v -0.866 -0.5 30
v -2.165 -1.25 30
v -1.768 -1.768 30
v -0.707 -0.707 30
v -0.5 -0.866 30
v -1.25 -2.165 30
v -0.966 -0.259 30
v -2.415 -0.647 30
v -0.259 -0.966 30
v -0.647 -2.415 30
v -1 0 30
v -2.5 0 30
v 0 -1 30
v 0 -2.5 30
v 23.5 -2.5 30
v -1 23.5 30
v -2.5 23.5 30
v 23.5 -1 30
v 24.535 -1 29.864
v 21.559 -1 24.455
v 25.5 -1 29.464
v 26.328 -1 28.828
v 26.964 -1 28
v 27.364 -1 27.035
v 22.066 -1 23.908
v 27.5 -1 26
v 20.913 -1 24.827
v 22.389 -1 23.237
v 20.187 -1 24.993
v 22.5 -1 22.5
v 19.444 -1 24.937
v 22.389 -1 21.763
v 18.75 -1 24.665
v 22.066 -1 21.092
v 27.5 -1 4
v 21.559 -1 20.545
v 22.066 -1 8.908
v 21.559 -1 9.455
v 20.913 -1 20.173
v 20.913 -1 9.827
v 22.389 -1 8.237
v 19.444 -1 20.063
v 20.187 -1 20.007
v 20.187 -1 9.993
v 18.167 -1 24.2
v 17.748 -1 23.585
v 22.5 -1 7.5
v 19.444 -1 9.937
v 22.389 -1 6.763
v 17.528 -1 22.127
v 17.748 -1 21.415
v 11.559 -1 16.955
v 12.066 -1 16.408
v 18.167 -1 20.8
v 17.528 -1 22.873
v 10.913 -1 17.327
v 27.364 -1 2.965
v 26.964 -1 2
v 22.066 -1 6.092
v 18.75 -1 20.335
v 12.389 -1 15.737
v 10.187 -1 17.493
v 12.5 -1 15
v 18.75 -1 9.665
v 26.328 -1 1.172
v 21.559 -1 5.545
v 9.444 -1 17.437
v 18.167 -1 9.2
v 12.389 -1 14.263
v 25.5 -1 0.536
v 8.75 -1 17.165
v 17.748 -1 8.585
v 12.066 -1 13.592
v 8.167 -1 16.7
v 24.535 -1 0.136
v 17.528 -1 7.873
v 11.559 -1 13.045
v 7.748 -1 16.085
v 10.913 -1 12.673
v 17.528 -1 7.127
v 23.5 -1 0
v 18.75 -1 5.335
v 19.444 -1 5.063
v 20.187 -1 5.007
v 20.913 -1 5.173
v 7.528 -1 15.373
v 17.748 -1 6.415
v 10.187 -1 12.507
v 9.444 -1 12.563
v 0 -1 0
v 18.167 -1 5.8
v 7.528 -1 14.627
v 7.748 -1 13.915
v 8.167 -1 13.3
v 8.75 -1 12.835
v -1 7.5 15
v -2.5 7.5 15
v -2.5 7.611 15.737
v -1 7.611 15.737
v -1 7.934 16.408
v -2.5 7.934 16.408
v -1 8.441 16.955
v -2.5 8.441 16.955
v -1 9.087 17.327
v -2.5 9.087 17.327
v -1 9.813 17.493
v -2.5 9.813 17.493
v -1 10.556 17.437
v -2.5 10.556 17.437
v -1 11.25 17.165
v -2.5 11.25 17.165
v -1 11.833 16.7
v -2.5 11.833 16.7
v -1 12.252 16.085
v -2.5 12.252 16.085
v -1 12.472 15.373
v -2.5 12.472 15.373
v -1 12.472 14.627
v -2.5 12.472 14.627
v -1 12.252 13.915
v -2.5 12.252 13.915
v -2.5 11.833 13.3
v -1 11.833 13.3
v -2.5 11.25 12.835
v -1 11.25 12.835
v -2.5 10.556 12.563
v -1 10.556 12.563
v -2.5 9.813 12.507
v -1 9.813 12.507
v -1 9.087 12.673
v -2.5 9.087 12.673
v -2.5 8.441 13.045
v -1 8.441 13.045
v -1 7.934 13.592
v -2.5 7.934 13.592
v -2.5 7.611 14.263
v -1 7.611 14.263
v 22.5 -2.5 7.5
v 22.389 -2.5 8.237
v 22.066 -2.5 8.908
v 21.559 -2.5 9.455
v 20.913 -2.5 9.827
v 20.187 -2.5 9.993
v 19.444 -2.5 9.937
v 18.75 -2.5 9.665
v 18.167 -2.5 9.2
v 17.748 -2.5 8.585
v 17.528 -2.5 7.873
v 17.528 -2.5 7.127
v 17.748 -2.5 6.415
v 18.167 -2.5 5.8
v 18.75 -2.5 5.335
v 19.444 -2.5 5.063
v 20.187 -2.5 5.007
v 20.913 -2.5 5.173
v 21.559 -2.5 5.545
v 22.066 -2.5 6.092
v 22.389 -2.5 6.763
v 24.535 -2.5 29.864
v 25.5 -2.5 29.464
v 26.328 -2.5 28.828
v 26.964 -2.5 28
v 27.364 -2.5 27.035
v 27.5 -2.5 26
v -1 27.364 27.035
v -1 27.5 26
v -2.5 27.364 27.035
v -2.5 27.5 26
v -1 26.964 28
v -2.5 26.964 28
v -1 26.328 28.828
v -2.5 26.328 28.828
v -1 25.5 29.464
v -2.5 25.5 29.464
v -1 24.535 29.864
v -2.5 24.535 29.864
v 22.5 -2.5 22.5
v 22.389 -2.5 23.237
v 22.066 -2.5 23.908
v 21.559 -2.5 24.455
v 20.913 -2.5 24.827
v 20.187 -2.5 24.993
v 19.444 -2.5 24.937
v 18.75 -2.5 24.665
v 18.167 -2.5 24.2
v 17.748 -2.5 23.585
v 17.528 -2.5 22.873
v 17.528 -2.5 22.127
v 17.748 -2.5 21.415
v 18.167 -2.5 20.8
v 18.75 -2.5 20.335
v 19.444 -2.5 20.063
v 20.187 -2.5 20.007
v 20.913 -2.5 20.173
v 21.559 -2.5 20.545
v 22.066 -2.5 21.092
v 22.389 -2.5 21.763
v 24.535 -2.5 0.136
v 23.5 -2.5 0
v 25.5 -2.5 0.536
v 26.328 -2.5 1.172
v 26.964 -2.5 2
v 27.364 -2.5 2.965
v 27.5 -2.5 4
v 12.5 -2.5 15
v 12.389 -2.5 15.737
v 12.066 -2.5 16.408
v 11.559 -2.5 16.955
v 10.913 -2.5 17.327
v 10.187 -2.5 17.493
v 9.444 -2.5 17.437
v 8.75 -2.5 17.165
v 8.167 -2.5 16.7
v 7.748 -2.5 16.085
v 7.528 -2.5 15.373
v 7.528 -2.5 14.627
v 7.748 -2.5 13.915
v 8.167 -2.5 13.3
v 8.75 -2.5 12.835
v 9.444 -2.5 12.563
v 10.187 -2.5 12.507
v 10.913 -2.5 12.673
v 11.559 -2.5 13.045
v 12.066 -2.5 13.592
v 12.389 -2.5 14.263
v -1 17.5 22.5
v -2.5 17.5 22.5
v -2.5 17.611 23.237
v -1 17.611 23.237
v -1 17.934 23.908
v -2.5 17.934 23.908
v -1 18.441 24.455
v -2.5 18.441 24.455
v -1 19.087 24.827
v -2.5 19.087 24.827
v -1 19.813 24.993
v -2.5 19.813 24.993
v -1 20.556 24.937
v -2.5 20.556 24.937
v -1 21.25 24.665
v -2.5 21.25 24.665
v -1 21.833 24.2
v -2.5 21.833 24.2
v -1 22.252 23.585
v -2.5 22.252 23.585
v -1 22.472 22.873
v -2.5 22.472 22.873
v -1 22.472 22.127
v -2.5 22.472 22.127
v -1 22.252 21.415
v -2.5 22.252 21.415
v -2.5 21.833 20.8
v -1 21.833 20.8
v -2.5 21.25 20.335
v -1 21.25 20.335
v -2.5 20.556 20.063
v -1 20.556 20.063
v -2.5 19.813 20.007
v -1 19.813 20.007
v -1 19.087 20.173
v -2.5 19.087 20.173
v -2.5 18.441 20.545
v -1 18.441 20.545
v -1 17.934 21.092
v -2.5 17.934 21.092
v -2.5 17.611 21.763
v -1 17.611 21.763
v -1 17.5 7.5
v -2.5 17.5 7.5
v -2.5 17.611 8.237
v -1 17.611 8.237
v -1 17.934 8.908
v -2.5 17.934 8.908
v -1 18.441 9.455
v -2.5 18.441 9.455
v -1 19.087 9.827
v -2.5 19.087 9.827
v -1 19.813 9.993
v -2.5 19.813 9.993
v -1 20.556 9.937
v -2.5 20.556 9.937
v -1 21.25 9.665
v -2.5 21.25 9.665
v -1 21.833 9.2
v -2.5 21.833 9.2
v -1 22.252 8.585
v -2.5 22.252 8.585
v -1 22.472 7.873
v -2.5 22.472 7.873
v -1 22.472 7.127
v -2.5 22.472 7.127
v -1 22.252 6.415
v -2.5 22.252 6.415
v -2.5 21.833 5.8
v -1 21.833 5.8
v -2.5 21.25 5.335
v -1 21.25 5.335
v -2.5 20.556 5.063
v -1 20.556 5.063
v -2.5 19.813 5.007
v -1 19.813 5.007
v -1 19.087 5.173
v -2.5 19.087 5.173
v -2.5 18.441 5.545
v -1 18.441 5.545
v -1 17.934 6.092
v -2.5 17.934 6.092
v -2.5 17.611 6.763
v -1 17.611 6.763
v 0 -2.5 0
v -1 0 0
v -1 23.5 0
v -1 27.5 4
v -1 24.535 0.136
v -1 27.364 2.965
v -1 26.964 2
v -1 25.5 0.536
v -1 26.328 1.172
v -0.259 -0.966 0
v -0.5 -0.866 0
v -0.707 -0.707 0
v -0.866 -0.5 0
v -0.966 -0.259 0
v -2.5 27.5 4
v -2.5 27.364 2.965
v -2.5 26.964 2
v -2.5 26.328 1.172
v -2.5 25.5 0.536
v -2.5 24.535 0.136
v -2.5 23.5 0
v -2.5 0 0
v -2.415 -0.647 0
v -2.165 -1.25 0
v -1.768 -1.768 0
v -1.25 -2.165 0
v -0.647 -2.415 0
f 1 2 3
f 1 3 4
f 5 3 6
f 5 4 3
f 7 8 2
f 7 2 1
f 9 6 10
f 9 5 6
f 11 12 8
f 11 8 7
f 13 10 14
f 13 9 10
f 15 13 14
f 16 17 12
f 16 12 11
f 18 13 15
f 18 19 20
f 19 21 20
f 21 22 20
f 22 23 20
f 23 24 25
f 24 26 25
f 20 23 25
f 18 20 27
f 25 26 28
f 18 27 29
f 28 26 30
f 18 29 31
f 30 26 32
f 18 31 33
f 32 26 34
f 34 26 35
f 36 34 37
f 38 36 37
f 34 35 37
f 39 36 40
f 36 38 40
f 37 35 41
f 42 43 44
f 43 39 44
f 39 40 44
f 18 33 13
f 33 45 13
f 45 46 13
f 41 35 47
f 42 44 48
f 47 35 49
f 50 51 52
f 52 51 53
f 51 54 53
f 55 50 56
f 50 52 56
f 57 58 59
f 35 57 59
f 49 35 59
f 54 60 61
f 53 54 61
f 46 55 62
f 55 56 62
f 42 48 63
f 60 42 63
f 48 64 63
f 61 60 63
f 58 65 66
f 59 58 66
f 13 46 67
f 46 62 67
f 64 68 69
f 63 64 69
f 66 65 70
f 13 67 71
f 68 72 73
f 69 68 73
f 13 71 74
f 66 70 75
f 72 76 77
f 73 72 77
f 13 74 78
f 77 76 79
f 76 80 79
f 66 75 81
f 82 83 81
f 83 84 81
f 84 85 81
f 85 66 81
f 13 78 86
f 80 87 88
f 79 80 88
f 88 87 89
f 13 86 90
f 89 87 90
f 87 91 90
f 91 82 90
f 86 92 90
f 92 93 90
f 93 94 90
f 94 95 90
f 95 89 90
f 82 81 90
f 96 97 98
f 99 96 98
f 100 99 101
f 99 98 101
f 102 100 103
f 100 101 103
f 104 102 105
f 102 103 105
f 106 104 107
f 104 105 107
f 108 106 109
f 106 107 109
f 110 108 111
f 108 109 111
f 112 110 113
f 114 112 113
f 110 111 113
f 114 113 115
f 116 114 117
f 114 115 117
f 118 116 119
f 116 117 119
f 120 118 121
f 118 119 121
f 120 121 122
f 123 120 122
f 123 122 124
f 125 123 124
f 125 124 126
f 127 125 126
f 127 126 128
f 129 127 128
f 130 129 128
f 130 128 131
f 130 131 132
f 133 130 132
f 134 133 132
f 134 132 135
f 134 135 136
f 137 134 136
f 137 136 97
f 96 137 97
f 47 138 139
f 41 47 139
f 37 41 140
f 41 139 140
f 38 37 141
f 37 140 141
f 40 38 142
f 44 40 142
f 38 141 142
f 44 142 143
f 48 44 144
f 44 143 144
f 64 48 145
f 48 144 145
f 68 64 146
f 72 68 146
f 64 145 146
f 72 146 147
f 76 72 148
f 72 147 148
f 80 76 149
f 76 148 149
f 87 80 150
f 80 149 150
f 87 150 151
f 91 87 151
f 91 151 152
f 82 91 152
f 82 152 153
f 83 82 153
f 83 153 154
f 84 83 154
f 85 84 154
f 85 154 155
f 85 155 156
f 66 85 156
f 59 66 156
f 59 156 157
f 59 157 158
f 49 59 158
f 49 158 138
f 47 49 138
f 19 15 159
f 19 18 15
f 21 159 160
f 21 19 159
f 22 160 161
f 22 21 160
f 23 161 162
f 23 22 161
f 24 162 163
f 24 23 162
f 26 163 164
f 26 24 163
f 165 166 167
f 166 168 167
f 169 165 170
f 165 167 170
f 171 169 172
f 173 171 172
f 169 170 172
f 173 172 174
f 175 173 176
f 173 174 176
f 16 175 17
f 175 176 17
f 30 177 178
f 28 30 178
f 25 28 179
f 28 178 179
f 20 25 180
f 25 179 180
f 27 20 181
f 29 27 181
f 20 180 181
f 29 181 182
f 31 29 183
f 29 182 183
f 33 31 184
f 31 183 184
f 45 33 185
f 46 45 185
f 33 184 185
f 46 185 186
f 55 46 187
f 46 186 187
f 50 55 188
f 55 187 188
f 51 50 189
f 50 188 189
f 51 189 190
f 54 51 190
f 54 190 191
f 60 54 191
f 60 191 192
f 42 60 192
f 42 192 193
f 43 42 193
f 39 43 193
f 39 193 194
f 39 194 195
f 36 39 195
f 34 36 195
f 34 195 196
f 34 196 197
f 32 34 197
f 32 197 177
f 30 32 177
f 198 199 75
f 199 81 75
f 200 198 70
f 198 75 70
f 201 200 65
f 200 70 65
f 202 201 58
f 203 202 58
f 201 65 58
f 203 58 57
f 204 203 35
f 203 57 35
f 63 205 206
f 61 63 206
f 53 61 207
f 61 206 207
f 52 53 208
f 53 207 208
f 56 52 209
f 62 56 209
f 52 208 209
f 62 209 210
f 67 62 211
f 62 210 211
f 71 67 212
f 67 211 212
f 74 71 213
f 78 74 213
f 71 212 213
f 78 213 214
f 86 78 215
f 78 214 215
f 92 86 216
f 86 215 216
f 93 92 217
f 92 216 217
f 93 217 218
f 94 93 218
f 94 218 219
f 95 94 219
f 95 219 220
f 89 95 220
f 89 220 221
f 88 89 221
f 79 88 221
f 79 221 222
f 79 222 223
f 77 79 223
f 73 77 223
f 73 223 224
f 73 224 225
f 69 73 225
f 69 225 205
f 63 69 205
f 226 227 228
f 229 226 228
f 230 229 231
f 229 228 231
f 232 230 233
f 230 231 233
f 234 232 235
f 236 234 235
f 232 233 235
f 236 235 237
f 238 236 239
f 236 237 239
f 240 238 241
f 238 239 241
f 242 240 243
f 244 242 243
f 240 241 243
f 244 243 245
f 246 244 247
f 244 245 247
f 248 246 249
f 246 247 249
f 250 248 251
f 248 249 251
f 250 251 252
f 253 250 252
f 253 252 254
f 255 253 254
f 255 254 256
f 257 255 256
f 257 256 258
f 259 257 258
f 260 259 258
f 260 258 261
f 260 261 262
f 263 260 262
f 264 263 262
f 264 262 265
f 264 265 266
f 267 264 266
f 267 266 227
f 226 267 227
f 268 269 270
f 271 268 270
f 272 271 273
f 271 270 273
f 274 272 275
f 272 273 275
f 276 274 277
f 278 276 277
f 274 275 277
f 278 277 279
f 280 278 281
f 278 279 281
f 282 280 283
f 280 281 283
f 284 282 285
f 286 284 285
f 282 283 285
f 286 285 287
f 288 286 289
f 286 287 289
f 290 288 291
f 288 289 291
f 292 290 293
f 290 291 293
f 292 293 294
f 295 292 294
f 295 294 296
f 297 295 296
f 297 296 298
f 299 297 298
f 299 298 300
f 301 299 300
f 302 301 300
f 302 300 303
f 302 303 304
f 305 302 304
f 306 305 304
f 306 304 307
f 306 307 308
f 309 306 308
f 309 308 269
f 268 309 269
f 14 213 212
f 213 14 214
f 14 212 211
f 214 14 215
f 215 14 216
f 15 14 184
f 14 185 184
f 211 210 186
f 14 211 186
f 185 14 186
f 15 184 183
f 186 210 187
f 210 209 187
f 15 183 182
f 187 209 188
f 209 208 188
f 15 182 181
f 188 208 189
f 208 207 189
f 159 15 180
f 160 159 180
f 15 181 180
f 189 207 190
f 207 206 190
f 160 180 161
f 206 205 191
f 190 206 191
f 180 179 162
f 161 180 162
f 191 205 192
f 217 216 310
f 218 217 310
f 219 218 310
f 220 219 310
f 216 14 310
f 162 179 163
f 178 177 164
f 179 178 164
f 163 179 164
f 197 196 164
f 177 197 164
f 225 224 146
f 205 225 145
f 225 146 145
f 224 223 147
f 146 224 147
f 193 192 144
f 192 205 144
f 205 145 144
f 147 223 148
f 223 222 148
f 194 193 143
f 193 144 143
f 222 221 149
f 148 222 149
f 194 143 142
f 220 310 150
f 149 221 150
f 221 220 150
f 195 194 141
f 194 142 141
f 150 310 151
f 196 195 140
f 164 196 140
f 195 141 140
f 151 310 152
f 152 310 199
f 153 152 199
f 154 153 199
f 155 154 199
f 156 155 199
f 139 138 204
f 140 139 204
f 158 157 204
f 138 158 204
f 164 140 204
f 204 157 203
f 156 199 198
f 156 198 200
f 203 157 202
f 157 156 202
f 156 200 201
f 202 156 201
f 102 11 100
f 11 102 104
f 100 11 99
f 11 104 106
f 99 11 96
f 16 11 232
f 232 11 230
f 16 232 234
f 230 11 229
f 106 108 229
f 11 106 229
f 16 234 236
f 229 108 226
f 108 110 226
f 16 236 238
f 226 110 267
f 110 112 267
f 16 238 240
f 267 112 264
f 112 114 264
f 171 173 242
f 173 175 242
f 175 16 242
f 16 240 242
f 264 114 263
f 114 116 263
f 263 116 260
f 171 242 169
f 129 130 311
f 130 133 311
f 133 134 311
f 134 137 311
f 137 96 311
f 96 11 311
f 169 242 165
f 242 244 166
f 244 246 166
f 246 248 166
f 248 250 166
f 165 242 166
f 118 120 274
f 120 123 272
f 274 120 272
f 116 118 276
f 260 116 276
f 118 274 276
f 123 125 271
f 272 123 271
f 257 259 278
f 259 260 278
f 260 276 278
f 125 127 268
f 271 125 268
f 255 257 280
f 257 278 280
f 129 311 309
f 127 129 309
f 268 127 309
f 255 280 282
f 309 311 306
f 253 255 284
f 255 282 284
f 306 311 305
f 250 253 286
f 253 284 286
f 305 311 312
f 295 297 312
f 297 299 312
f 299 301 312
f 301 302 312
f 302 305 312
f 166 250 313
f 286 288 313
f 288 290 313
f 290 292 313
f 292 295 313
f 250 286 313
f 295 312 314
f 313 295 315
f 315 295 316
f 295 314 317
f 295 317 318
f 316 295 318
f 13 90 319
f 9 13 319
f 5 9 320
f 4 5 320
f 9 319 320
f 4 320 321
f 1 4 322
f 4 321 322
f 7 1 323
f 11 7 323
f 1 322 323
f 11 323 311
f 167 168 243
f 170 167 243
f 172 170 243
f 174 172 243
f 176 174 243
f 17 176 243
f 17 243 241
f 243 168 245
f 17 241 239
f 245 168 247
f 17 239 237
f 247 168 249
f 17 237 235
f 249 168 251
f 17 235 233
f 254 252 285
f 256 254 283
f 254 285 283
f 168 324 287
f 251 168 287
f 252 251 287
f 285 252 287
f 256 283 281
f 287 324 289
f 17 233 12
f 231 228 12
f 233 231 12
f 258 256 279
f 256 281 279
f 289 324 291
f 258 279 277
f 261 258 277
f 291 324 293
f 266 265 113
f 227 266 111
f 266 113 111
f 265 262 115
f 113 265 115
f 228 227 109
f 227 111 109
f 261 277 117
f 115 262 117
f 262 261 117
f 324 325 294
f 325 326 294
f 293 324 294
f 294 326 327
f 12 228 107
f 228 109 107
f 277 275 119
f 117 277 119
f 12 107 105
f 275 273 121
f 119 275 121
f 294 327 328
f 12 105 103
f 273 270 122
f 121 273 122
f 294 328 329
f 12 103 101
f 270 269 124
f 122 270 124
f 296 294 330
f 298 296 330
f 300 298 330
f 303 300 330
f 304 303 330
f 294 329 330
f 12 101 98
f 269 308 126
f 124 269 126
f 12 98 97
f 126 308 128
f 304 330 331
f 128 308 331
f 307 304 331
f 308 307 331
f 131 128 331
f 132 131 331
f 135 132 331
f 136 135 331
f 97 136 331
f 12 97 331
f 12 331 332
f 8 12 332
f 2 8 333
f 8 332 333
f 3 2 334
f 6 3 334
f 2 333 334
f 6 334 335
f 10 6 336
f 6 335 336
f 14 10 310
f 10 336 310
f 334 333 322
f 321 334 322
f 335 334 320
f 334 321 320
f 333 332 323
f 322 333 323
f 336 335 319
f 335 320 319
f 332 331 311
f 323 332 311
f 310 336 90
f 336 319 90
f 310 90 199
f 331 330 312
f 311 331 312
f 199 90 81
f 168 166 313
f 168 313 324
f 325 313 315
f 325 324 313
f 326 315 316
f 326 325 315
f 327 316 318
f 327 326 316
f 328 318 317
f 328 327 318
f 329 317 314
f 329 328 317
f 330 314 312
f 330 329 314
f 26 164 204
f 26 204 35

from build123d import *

# Parameters (mm, degrees)
EXTRUDE_1_DEPTH     = 30
SKETCH_2_R          = 2.5
CUT_EXTRUDE_1_DEPTH = 40
SKETCH_3_R          = 2.5
CUT_EXTRUDE_2_DEPTH = 40
FILLET_1_R          = 4


with BuildPart() as part:
    # Эскиз1 → Бобышка-Вытянуть1 (new body)
    with BuildSketch(Plane.XY):
        with BuildLine():
            Line((-2.5, 27.5), (-2.5, 0))
            ThreePointArc((-2.5, 0), (-1.767766953, -1.767766953), (0, -2.5))
            Line((0, -2.5), (27.5, -2.5))
            Line((27.5, -2.5), (27.5, -1))
            Line((27.5, -1), (0, -1))
            ThreePointArc((0, -1), (-0.707106781, -0.707106781), (-1, 0))
            Line((-1, 0), (-1, 27.5))
            Line((-1, 27.5), (-2.5, 27.5))
        make_face()
    extrude(amount=EXTRUDE_1_DEPTH)

    # Эскиз2 → Вырез-Вытянуть1 (cut)
    with BuildSketch(Plane.ZY.offset(2.5)):
        with Locations(Location((7.5, 20, 0), (0, 0, 270))):
            Circle(SKETCH_2_R)
        with Locations(Location((22.5, 20, 0), (0, 0, 270))):
            Circle(SKETCH_2_R)
        with Locations(Location((15, 10, 0), (0, 0, 270))):
            Circle(SKETCH_2_R)
    extrude(amount=-CUT_EXTRUDE_1_DEPTH, mode=Mode.SUBTRACT)

    # Эскиз3 → Вырез-Вытянуть2 (cut)
    with BuildSketch(Plane.XZ.offset(2.5)):
        with Locations((20, 7.5)):
            Circle(SKETCH_3_R)
        with Locations((20, 22.5)):
            Circle(SKETCH_3_R)
        with Locations((10, 15)):
            Circle(SKETCH_3_R)
    extrude(amount=-CUT_EXTRUDE_2_DEPTH, mode=Mode.SUBTRACT)

    # Скругление1
    fillet_1_edges = [part.edges().sort_by_distance(p)[0] for p in [
        (-1.75, 27.5, 0),
        (27.5, -1.75, 30),
        (-1.75, 27.5, 30),
        (27.5, -1.75, 0),
    ]]
    fillet(fillet_1_edges, radius=FILLET_1_R)


solid = part.part
